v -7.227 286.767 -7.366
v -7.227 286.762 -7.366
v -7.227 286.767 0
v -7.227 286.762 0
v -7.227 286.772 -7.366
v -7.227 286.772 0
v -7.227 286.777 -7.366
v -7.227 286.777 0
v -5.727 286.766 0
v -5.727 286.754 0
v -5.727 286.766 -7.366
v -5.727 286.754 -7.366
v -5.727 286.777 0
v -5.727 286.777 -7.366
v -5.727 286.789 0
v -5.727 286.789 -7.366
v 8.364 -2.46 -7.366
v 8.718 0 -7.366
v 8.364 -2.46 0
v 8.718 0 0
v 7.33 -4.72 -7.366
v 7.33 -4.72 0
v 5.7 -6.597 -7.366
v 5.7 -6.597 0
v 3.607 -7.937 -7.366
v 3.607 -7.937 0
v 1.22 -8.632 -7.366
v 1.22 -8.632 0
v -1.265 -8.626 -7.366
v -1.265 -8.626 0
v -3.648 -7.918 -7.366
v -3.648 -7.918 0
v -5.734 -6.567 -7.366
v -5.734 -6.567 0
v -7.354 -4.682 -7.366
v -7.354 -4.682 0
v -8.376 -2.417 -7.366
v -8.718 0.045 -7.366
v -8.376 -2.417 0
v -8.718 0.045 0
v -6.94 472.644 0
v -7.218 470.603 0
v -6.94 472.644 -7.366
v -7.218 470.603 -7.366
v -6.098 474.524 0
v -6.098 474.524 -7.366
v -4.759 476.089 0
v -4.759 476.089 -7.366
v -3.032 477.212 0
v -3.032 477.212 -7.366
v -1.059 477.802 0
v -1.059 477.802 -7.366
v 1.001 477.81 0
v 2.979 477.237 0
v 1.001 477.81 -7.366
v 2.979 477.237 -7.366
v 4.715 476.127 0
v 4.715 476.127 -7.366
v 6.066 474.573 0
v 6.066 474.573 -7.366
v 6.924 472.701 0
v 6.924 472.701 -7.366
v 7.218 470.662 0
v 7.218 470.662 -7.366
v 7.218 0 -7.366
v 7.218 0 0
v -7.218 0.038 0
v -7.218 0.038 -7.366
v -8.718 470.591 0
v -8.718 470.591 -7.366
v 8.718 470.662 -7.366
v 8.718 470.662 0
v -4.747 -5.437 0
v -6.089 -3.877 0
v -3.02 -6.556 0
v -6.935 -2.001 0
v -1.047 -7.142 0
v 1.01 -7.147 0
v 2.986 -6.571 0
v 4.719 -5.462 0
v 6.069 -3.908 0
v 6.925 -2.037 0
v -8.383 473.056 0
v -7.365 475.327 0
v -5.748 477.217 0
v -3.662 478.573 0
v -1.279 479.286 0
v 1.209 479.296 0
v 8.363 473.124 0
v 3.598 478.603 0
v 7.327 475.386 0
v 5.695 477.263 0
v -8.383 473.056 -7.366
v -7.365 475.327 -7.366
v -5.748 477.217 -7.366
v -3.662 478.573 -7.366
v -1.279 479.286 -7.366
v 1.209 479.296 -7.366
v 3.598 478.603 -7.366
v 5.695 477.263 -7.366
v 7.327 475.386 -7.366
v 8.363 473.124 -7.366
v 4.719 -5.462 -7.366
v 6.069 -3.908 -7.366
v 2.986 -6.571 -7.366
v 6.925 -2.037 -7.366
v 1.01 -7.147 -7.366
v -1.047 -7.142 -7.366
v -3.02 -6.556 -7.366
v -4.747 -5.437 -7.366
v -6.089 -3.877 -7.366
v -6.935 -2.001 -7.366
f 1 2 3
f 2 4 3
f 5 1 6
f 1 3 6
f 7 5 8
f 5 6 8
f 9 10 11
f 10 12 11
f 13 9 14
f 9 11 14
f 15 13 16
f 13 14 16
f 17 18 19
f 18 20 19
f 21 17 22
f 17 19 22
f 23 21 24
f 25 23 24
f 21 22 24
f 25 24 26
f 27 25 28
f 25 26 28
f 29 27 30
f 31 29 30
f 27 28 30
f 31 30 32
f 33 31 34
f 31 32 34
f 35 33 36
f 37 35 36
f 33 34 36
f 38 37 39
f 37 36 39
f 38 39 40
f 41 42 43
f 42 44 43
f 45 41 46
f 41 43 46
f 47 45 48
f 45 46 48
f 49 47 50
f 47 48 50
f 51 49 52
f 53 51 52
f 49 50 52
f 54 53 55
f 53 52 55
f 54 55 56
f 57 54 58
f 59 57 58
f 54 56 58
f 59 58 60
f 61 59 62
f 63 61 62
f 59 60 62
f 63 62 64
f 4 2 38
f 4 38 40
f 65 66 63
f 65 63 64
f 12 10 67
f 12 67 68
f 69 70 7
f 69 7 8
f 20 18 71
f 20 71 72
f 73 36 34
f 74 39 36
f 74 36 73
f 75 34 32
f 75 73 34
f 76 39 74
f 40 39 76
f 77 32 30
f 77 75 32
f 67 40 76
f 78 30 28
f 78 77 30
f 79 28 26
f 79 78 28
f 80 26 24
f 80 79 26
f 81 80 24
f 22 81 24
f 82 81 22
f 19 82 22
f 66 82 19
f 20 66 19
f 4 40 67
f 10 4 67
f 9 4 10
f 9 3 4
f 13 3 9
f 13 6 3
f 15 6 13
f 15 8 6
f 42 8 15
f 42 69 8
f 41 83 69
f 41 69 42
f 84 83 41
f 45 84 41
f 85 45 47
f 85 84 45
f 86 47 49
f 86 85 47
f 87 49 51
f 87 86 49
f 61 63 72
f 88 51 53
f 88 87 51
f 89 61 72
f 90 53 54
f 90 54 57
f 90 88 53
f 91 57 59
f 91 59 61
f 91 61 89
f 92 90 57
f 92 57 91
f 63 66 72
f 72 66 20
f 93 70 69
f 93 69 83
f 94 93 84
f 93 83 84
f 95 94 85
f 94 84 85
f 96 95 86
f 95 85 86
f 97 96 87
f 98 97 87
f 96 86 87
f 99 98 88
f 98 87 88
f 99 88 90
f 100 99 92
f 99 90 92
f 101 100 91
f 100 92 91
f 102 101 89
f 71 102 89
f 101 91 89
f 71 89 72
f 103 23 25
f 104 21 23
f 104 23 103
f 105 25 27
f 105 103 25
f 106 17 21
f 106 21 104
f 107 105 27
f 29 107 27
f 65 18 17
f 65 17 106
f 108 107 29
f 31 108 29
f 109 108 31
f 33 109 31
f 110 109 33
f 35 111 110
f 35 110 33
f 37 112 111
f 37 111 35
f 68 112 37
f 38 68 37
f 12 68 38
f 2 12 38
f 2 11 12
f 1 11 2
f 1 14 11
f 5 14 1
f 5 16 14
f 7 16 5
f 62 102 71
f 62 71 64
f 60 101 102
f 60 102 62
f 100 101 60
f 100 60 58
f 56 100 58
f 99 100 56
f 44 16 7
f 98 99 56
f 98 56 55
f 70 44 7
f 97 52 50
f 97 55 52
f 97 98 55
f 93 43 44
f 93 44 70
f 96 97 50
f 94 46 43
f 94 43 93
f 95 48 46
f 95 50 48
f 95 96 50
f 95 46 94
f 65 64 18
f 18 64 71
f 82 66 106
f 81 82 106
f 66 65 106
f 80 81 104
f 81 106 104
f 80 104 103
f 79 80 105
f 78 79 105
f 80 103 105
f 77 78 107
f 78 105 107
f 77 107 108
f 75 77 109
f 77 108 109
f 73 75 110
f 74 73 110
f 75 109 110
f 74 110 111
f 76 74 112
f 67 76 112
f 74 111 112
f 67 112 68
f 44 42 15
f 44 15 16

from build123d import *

# Parameters (mm, degrees)
SKETCH3_W = 7.366
SKETCH3_H = 1.5


with BuildPart() as part:
    # Sweep1: sweep along a path in Sketch2
    with BuildLine(Plane.XY) as sweep1_path:
        Line((-7.217959412, 0.037533359), (-5.727035895, 286.753819557))
        ThreePointArc((-5.727035895, 286.753819557), (-5.72700281, 286.771488203), (-5.727087308, 286.789156677))
        Line((-5.727087308, 286.789156677), (-7.217819637, 470.60346355))
        ThreePointArc((-7.217819637, 470.60346355), (-0.029268466, 477.879997648), (7.218056998, 470.662))
        Line((7.218056998, 470.662), (7.218056998, 0))
        ThreePointArc((7.218056998, 0), (-0.018766743, -7.218032601), (-7.217959412, 0.037533359))
    # Sketch3 → Sweep1 (sweep)
    with BuildSketch(Plane(origin=(0, 0, 0), x_dir=(0, 0, -1), z_dir=(1, 0, 0))):
        with Locations((3.683, 478.630056998)):
            Rectangle(SKETCH3_W, SKETCH3_H)
    sweep(path=sweep1_path.line)


solid = part.part
